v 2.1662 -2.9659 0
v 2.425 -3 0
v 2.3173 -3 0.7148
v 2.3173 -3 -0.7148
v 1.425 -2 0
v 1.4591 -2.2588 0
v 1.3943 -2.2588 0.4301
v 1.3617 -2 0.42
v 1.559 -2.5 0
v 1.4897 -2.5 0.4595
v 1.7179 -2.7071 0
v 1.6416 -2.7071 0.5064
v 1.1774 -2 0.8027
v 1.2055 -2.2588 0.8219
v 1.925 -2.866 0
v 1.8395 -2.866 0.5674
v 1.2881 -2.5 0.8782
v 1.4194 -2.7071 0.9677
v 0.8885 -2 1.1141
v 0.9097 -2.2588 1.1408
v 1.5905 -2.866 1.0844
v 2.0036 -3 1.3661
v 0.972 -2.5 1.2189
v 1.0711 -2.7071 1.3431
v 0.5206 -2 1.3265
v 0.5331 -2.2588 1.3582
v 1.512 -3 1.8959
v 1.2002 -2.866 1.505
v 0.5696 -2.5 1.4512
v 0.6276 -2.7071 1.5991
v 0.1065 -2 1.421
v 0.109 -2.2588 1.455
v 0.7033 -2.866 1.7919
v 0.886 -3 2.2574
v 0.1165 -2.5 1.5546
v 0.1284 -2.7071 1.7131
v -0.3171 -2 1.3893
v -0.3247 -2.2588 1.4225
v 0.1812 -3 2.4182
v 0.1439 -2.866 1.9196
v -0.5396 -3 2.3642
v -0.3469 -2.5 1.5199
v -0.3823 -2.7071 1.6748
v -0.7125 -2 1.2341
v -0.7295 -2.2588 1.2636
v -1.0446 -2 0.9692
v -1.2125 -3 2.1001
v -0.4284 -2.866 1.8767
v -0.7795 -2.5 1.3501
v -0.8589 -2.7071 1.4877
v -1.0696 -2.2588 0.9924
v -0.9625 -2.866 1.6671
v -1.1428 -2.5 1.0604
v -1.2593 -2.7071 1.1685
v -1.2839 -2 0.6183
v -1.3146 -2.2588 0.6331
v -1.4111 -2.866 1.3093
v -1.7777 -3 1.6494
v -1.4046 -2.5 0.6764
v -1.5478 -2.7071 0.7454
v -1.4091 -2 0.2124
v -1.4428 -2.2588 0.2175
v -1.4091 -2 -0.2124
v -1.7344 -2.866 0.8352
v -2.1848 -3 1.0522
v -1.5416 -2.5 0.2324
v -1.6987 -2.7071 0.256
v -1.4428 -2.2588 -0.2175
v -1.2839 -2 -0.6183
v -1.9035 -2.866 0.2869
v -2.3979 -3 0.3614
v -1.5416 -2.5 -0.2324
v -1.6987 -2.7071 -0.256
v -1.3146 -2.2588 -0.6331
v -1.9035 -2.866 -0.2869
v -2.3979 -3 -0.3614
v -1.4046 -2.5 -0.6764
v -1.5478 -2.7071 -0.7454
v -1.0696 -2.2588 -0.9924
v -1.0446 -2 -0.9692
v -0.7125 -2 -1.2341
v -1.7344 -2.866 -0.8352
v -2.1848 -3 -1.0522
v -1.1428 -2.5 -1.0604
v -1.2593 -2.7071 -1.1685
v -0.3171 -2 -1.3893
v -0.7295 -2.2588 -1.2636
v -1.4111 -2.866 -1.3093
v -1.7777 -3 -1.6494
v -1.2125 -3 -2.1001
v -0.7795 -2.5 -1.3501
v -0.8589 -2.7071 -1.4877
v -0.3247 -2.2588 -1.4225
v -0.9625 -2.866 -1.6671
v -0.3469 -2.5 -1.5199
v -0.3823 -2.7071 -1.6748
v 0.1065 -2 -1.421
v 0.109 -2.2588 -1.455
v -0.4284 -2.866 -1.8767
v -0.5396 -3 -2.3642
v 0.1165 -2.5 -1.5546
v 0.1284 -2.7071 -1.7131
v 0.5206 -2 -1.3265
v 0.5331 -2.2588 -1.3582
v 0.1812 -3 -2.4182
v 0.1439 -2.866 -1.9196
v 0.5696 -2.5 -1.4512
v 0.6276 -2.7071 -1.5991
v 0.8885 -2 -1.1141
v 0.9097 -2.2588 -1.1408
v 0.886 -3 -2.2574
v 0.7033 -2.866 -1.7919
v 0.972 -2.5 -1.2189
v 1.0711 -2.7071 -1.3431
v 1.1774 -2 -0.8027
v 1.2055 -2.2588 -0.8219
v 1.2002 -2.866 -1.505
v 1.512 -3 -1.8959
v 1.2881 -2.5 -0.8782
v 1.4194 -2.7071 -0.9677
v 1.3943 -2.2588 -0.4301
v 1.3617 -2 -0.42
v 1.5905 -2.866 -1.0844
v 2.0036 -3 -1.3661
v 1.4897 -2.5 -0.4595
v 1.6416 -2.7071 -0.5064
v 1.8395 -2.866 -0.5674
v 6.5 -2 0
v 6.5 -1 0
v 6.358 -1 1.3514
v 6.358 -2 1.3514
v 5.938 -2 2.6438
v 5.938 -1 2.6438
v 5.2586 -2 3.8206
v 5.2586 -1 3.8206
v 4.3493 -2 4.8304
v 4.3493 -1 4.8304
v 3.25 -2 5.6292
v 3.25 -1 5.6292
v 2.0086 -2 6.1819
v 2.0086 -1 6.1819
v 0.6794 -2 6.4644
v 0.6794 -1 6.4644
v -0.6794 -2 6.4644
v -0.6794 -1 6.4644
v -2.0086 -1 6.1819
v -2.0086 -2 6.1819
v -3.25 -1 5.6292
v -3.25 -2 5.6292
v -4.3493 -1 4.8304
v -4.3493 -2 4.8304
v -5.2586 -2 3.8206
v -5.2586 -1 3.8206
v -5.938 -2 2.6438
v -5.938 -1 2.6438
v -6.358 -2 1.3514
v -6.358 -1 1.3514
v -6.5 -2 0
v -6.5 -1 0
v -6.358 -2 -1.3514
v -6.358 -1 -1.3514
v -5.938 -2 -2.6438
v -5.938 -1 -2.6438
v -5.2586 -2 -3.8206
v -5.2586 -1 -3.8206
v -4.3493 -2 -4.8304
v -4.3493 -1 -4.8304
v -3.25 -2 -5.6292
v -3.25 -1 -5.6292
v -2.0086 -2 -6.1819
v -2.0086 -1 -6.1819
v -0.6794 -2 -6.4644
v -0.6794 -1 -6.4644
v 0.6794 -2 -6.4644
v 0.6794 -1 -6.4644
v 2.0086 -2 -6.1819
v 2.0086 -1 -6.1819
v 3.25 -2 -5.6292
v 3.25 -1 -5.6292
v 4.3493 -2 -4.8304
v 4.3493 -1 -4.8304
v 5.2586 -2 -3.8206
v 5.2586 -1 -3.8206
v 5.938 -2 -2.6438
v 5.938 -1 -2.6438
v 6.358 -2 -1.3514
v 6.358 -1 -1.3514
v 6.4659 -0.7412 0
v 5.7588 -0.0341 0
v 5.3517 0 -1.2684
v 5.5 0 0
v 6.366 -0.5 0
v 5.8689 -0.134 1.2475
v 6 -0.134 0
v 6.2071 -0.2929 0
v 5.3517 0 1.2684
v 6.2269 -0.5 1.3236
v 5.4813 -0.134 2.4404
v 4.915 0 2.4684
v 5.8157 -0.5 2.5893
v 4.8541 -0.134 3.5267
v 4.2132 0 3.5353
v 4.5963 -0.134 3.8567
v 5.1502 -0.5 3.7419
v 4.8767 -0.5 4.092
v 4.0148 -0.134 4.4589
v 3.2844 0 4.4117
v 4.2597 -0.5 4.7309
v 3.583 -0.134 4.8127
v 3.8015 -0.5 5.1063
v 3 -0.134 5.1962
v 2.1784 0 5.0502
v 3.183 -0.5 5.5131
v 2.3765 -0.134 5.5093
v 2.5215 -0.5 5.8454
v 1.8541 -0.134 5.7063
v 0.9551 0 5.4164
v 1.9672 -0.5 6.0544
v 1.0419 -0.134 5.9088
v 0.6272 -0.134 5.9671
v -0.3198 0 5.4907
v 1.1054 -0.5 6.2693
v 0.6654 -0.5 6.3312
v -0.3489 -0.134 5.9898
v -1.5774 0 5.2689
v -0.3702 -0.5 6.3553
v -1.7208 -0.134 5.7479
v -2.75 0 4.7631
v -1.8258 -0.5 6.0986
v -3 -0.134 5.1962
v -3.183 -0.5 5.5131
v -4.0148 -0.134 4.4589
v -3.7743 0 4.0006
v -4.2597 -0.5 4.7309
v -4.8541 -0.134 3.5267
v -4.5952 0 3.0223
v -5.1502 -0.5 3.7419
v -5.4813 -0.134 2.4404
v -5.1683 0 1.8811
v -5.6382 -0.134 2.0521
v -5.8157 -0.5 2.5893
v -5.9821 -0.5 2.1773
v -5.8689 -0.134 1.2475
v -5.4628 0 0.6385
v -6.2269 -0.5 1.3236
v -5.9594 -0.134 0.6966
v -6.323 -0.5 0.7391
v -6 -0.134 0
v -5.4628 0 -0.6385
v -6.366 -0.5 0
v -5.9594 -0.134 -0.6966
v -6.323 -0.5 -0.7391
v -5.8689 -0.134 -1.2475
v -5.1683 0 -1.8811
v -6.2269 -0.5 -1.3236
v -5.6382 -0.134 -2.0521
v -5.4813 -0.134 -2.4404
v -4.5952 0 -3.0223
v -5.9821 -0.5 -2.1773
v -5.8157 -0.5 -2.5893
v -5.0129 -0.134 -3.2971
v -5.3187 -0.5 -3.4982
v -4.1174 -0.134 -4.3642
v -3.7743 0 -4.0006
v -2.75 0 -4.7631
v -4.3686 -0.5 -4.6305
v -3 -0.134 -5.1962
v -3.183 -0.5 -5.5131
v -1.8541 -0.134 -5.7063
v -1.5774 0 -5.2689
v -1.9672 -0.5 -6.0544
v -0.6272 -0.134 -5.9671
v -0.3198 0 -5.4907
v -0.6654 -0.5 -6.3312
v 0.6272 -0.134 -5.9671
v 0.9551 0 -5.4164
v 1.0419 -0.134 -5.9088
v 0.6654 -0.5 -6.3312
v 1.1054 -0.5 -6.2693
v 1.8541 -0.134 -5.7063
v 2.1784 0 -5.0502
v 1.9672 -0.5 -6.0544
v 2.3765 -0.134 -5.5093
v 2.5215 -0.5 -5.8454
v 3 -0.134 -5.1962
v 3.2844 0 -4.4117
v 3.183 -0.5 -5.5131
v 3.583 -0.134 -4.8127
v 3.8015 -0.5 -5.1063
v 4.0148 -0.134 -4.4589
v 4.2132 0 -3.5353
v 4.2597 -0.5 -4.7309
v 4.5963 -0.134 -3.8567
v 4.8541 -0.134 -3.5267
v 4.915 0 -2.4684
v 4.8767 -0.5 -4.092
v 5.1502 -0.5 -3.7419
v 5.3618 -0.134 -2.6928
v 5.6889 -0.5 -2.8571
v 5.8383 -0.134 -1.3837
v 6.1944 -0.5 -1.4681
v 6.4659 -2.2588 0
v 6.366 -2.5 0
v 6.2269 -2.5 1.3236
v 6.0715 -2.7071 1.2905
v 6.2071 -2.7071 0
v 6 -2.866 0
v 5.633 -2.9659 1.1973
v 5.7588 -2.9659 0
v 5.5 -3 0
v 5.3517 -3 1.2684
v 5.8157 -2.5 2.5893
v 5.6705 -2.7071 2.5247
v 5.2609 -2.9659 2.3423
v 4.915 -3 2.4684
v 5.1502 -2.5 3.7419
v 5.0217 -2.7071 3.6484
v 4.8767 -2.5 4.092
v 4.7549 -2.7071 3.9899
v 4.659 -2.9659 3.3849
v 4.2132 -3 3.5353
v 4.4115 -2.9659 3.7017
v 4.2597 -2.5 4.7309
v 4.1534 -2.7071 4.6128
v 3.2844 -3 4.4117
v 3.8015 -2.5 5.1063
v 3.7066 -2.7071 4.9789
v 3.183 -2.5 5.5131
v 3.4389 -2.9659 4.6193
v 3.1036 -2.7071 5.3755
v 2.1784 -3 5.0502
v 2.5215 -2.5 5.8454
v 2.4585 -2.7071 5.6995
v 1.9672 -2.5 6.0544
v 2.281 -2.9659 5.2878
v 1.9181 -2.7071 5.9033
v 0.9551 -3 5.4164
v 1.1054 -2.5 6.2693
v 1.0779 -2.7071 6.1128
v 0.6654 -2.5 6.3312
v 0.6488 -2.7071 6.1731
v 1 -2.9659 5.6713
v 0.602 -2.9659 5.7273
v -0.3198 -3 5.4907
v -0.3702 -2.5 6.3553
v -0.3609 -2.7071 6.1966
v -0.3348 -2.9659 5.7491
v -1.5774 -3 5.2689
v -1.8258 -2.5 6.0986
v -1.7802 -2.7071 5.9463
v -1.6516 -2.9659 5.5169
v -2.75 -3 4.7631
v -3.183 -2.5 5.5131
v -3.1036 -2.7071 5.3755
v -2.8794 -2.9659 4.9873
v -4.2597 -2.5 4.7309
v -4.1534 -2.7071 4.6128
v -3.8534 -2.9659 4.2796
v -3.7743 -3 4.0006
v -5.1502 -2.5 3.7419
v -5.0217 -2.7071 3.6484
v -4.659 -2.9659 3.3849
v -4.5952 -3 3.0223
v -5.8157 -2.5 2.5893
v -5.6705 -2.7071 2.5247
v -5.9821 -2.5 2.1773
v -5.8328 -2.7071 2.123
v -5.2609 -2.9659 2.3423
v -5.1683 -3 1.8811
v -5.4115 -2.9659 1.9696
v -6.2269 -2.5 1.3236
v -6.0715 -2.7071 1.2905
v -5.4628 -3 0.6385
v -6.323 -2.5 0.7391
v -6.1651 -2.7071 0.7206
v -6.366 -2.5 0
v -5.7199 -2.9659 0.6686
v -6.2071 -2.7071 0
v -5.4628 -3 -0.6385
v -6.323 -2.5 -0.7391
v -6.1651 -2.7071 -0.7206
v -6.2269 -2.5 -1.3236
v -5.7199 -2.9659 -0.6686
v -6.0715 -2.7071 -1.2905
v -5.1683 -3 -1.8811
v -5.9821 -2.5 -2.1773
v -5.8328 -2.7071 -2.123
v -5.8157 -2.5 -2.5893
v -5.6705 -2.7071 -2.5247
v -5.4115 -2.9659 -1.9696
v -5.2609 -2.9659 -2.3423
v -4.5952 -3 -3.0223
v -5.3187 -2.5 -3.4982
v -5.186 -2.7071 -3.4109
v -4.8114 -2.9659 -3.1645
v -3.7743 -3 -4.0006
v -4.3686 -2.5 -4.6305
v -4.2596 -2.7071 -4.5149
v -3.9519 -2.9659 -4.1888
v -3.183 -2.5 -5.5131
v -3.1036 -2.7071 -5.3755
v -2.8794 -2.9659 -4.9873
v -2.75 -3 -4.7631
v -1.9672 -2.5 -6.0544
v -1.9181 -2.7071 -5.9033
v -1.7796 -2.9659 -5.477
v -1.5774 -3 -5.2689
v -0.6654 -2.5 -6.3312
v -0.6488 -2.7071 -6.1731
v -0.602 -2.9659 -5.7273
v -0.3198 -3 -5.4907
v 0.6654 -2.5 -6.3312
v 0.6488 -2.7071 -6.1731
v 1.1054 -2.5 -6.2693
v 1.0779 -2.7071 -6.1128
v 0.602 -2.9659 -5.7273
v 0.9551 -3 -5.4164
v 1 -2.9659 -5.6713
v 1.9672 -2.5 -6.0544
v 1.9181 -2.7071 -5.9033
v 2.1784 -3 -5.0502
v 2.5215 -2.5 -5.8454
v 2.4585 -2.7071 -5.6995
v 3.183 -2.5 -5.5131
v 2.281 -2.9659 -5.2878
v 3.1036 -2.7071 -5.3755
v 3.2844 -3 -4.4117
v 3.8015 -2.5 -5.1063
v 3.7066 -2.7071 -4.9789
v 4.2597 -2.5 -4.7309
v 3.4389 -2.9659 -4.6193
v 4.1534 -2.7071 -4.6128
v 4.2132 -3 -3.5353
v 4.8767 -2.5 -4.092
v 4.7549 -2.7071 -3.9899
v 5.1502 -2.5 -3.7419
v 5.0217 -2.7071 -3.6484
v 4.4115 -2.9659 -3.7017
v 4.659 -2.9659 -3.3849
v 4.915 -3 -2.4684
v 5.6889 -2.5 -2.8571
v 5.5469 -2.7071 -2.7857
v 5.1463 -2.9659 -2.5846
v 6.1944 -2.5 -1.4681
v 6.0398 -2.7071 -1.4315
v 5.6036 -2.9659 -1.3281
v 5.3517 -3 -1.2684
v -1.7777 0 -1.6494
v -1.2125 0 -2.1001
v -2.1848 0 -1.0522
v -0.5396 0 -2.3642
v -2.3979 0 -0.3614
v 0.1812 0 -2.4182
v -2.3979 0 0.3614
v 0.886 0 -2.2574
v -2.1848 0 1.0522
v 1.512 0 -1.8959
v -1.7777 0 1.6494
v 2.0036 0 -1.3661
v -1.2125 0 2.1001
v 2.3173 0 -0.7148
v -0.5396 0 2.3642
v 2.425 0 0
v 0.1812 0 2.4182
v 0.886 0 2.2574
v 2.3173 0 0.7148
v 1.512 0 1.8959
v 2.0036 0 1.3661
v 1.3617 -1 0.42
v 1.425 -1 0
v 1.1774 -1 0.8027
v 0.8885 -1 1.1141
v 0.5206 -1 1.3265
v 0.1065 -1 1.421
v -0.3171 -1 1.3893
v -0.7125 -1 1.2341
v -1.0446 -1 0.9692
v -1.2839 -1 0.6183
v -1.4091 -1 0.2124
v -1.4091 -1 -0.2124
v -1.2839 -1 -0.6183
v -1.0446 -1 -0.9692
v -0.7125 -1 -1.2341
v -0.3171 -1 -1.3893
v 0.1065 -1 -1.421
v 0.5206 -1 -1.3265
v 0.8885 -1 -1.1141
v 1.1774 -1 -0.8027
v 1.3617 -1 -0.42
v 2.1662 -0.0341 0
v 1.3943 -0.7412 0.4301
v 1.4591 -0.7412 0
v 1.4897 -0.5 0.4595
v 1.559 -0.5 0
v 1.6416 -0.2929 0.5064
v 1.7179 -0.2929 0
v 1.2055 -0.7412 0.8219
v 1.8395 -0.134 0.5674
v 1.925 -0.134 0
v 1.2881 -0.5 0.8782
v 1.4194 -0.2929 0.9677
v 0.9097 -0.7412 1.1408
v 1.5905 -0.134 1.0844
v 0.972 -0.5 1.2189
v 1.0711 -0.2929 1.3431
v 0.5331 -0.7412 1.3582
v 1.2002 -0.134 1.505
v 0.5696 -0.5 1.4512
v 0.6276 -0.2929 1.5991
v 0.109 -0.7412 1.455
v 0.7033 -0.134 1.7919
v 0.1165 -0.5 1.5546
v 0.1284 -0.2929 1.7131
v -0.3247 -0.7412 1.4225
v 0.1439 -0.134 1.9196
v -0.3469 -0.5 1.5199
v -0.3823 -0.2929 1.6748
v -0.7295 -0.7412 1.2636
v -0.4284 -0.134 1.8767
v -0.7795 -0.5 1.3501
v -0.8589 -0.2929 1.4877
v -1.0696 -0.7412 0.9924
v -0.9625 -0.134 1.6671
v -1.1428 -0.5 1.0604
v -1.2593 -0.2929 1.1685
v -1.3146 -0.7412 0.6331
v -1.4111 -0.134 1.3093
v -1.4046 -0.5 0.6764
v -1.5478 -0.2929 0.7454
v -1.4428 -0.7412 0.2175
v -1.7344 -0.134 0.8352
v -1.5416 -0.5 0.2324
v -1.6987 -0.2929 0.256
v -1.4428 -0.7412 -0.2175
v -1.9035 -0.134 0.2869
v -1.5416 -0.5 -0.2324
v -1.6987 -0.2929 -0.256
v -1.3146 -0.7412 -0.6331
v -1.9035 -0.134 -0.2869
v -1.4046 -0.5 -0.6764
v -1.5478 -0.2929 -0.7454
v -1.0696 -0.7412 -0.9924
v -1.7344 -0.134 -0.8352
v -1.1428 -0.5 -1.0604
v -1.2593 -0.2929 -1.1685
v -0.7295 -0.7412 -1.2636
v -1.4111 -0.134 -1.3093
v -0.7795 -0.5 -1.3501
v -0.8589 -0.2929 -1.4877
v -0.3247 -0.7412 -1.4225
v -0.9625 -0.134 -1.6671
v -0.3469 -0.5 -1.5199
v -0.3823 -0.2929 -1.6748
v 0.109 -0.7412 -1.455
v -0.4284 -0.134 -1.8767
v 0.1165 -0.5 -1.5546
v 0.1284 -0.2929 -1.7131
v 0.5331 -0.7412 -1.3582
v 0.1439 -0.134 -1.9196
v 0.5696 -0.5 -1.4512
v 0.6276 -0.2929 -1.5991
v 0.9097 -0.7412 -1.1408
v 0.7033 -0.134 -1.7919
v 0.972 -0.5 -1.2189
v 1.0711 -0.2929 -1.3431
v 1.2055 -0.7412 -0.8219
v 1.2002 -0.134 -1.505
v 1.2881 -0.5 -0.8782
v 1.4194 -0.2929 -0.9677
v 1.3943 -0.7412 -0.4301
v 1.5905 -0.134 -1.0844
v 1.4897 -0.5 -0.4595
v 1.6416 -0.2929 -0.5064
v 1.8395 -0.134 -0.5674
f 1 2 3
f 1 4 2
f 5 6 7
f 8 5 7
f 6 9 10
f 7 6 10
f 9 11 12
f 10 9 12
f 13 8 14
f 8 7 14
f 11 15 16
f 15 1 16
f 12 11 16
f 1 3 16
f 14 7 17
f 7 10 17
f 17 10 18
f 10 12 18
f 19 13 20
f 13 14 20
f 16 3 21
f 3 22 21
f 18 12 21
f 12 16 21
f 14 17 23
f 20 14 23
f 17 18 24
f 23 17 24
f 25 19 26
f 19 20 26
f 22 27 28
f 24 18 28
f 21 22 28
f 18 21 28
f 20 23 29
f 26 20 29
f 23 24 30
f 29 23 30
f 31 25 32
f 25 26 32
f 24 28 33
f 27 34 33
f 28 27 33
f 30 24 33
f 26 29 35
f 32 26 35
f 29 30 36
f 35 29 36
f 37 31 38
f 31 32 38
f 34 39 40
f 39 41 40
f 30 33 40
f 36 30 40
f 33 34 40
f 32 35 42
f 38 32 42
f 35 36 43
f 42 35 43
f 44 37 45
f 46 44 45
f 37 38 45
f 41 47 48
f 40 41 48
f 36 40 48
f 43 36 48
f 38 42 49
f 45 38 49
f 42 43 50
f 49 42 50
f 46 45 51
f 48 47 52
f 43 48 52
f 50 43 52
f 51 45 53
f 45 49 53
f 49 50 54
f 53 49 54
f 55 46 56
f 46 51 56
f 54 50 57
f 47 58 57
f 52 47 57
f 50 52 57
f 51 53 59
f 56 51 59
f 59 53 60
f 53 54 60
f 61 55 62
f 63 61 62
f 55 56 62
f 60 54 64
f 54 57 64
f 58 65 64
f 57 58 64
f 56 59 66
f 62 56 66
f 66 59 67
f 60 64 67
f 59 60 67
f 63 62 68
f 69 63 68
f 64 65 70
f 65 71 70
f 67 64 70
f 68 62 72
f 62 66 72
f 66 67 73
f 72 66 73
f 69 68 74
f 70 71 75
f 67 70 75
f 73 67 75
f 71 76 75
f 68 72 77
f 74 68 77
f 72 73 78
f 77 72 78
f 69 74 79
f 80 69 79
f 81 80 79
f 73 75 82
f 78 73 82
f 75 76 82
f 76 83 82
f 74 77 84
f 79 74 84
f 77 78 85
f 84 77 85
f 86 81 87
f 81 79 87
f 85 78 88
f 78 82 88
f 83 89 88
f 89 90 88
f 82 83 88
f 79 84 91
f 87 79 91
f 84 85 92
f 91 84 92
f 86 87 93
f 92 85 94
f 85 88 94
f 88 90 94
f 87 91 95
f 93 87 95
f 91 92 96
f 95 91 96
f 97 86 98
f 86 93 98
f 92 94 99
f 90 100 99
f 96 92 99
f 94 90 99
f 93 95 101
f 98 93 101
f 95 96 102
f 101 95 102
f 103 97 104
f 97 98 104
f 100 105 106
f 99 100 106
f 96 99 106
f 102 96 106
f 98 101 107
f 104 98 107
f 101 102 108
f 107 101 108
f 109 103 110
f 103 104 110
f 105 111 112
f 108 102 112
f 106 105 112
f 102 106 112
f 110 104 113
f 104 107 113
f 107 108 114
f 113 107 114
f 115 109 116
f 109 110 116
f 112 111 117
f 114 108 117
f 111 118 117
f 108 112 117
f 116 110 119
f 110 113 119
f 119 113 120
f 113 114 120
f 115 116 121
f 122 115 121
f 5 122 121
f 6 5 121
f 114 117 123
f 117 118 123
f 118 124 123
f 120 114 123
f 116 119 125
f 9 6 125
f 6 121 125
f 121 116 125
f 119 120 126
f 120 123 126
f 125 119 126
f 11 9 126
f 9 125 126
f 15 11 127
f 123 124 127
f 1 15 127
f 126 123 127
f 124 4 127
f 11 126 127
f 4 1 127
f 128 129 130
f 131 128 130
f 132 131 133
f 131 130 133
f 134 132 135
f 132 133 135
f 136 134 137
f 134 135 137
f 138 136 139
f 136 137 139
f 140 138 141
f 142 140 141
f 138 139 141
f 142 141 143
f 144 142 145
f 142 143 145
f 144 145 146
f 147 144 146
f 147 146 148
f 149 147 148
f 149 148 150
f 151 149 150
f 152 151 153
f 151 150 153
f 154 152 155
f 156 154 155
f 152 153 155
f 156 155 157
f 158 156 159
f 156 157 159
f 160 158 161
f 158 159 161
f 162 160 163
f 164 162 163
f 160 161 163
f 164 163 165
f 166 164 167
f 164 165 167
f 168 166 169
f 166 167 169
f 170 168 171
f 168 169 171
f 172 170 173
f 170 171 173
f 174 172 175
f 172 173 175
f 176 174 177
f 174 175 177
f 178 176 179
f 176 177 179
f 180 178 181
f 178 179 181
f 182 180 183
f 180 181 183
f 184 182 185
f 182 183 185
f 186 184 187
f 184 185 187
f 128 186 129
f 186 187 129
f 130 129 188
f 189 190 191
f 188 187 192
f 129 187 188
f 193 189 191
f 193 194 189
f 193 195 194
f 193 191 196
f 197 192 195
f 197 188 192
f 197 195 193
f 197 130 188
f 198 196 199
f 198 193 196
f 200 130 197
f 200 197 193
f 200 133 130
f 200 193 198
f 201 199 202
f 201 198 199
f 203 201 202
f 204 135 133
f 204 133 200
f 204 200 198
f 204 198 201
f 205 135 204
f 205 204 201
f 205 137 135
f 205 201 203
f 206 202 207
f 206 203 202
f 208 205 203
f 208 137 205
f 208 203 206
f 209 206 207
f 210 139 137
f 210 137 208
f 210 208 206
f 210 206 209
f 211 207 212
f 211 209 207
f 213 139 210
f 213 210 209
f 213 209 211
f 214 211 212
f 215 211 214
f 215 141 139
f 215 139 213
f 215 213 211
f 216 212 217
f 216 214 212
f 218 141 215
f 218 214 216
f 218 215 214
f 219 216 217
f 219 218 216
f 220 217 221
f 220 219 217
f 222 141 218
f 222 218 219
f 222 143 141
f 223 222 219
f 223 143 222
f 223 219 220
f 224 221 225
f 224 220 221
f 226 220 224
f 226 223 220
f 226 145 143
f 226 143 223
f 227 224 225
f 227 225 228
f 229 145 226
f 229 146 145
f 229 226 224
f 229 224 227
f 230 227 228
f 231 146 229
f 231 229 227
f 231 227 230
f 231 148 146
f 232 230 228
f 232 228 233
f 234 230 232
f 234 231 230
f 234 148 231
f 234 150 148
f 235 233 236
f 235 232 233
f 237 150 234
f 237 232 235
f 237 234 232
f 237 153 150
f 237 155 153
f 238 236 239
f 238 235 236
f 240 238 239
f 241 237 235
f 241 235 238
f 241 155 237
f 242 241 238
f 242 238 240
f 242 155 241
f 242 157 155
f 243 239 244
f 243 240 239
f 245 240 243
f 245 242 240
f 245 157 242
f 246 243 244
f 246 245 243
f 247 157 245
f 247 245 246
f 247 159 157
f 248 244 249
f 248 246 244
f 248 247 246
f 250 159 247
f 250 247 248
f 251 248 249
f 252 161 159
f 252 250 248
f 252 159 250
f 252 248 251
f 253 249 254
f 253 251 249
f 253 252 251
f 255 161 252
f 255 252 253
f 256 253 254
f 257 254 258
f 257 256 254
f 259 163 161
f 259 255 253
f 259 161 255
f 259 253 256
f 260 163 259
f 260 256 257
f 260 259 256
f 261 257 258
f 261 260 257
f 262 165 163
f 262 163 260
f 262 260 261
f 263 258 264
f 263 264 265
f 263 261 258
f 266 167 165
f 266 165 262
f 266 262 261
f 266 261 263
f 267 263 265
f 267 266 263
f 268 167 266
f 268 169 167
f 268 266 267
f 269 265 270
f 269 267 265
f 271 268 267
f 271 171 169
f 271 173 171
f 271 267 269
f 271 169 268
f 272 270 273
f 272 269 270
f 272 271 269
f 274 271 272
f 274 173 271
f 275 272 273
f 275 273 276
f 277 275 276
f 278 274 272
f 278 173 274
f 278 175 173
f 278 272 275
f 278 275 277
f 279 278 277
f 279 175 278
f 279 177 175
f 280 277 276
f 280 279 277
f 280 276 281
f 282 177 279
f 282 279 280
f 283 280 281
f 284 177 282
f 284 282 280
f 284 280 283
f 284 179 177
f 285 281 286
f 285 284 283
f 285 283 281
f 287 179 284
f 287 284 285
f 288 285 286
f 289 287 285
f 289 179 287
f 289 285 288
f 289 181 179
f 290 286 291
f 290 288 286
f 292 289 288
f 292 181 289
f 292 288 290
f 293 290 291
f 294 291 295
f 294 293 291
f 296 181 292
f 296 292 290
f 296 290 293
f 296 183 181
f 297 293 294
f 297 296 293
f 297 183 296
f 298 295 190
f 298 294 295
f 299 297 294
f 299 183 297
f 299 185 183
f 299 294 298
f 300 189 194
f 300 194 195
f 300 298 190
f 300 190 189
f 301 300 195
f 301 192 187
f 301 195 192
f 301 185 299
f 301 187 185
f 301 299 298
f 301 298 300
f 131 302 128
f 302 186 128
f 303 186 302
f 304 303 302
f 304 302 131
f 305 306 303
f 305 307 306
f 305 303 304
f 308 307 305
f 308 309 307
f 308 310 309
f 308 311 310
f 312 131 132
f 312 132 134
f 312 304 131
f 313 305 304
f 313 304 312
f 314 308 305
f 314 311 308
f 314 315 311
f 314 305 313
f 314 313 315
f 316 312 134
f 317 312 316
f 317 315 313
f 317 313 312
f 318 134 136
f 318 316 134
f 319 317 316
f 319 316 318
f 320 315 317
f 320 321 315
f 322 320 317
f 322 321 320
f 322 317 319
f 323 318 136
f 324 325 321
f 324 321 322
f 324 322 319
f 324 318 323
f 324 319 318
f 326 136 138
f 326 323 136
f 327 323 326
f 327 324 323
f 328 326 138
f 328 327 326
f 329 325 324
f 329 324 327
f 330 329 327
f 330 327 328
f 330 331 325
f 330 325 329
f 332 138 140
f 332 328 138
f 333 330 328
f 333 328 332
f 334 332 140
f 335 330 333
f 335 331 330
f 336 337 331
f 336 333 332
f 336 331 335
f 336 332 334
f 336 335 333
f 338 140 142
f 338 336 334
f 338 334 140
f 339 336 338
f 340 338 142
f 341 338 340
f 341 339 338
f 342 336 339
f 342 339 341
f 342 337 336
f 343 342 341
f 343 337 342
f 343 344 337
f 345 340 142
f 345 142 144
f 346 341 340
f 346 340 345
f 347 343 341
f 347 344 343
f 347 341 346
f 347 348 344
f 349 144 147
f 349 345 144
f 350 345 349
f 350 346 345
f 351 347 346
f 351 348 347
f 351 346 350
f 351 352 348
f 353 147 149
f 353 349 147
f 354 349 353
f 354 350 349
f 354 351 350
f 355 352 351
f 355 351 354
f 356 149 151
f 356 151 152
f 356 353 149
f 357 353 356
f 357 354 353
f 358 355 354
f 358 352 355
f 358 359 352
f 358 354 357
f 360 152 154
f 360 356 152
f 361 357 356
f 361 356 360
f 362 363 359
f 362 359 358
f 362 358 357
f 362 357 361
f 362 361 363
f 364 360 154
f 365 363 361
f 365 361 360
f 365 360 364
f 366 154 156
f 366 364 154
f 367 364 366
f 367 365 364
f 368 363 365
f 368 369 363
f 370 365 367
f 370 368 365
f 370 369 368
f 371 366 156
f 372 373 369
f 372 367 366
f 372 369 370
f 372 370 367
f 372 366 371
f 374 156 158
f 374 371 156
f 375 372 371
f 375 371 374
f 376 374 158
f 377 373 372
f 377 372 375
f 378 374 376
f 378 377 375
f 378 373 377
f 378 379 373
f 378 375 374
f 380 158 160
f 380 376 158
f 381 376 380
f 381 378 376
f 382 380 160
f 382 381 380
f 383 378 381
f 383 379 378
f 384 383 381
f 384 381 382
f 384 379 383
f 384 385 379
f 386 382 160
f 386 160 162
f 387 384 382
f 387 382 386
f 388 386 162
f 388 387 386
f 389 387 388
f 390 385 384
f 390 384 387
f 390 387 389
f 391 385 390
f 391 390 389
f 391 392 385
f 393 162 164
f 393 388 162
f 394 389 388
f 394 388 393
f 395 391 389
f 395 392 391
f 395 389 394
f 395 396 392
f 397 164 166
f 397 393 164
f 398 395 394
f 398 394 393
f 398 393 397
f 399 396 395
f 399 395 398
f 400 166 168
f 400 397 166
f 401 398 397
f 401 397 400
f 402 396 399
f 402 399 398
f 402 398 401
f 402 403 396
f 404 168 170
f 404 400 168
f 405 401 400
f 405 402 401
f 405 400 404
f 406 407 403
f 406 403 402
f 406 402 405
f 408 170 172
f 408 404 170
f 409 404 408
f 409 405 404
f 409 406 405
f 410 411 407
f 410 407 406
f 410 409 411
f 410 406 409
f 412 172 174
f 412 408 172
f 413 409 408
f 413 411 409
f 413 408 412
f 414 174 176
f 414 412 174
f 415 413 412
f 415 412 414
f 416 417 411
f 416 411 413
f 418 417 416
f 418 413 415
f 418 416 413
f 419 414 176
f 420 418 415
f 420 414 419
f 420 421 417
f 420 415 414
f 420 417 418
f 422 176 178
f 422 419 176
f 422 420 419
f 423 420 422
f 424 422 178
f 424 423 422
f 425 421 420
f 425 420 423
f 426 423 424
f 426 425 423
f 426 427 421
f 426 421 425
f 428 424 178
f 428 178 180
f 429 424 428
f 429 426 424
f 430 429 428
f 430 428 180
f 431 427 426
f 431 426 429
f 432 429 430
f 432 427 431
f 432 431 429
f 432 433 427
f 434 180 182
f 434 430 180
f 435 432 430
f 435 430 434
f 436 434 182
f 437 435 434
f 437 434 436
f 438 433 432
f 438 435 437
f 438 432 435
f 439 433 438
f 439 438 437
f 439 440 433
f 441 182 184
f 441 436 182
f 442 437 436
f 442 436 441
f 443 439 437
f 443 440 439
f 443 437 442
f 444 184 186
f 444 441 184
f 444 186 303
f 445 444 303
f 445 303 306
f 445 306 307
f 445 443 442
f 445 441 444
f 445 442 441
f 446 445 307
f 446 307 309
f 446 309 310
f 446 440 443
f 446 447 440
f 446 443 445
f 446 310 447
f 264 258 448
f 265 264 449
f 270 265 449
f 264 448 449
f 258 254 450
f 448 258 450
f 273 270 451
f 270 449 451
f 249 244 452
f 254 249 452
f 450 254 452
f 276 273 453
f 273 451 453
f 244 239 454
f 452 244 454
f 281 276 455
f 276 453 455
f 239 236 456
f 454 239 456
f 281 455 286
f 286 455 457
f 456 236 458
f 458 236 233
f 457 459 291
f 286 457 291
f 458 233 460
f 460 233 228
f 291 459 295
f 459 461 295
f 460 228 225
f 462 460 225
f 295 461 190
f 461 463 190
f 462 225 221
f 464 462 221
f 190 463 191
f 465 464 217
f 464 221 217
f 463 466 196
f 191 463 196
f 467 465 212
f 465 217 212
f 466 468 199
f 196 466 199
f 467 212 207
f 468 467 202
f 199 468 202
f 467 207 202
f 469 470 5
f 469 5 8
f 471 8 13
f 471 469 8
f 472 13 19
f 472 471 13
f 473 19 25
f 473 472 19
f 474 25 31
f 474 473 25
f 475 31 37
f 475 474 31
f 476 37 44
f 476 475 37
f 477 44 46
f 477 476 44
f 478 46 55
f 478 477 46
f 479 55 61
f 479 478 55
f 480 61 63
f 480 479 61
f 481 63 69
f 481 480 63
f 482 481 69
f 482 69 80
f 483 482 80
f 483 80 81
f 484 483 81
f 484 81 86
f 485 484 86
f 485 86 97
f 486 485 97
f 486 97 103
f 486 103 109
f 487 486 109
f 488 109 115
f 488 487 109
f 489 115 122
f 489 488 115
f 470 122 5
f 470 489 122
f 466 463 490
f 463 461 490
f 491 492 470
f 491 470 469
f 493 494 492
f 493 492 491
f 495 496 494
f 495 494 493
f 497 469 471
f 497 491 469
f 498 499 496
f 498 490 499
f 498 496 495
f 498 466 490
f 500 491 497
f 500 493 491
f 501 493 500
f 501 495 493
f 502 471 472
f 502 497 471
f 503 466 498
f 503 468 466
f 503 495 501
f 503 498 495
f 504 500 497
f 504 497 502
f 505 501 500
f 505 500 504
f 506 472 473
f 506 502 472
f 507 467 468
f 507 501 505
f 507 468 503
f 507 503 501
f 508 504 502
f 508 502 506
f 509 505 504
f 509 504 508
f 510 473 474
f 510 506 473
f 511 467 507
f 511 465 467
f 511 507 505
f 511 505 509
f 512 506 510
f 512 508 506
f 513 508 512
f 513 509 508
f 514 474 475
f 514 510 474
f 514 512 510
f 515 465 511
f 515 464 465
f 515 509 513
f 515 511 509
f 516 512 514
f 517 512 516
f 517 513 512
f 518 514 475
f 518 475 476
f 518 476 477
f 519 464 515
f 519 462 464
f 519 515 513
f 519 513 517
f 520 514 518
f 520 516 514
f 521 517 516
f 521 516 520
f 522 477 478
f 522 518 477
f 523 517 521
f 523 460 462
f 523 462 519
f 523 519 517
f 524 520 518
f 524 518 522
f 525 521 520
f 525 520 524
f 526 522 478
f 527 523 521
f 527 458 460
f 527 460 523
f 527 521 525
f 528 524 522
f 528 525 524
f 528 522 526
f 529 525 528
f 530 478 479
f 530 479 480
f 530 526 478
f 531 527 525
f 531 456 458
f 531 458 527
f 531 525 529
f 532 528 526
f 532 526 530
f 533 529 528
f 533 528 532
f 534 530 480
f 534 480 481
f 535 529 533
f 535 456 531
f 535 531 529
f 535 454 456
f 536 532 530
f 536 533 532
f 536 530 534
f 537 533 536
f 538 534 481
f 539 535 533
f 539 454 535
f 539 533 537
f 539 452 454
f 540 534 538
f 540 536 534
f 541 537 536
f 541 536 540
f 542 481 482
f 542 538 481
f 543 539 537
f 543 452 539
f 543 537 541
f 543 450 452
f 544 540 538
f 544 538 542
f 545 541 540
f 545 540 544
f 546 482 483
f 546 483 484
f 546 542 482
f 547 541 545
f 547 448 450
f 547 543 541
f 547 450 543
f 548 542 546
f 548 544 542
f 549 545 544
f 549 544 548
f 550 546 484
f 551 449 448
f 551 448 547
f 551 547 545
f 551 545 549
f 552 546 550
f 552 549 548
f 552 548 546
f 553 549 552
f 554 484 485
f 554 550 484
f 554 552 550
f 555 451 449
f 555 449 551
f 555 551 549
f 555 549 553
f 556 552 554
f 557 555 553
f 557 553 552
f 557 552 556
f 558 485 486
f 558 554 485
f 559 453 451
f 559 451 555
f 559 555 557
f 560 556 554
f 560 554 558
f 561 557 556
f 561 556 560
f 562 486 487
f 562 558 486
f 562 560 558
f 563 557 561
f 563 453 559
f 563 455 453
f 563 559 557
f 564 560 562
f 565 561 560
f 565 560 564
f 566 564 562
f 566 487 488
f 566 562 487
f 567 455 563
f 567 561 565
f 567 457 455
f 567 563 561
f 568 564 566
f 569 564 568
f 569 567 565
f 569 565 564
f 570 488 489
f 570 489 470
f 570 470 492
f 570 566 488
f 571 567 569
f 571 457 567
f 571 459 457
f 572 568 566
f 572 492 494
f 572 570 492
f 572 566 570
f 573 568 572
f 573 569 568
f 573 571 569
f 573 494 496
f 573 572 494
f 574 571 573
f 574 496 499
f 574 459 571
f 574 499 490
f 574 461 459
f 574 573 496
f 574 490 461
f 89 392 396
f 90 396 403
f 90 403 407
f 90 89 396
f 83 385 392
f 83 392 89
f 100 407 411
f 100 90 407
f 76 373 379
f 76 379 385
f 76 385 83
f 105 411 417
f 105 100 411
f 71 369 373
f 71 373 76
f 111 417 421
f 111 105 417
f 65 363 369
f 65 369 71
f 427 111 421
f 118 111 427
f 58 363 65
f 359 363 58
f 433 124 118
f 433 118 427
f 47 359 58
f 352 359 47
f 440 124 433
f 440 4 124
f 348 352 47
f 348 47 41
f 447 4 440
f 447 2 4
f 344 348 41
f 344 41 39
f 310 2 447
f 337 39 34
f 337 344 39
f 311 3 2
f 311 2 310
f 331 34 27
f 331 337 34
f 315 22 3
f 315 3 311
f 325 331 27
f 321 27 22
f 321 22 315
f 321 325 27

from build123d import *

# Parameters (mm, degrees)
F0_R     = 6.5
F0_R_2   = 1.425
F1_DEPTH = 3
F2_R     = 1
F3_R     = 1
F4_R     = 1
F5_R     = 1


with BuildPart() as f1:
    # F0 (on Front) → F1 (new body)
    with BuildSketch(Plane.XZ):
        Circle(F0_R)
        Circle(F0_R_2, mode=Mode.SUBTRACT)
    extrude(amount=F1_DEPTH)

    # F2
    f2_edges = [f1.edges().sort_by_distance(p)[0] for p in [
        (-1.425, -3, 0),
    ]]
    fillet(f2_edges, radius=F2_R)

    # F3
    f3_edges = [f1.edges().sort_by_distance(p)[0] for p in [
        (-1.425, 0, 0),
    ]]
    fillet(f3_edges, radius=F3_R)

    # F4
    f4_edges = [f1.edges().sort_by_distance(p)[0] for p in [
        (-6.5, 0, 0),
    ]]
    fillet(f4_edges, radius=F4_R)

    # F5
    f5_edges = [f1.edges().sort_by_distance(p)[0] for p in [
        (-6.5, -3, 0),
    ]]
    fillet(f5_edges, radius=F5_R)


solid = f1.part
